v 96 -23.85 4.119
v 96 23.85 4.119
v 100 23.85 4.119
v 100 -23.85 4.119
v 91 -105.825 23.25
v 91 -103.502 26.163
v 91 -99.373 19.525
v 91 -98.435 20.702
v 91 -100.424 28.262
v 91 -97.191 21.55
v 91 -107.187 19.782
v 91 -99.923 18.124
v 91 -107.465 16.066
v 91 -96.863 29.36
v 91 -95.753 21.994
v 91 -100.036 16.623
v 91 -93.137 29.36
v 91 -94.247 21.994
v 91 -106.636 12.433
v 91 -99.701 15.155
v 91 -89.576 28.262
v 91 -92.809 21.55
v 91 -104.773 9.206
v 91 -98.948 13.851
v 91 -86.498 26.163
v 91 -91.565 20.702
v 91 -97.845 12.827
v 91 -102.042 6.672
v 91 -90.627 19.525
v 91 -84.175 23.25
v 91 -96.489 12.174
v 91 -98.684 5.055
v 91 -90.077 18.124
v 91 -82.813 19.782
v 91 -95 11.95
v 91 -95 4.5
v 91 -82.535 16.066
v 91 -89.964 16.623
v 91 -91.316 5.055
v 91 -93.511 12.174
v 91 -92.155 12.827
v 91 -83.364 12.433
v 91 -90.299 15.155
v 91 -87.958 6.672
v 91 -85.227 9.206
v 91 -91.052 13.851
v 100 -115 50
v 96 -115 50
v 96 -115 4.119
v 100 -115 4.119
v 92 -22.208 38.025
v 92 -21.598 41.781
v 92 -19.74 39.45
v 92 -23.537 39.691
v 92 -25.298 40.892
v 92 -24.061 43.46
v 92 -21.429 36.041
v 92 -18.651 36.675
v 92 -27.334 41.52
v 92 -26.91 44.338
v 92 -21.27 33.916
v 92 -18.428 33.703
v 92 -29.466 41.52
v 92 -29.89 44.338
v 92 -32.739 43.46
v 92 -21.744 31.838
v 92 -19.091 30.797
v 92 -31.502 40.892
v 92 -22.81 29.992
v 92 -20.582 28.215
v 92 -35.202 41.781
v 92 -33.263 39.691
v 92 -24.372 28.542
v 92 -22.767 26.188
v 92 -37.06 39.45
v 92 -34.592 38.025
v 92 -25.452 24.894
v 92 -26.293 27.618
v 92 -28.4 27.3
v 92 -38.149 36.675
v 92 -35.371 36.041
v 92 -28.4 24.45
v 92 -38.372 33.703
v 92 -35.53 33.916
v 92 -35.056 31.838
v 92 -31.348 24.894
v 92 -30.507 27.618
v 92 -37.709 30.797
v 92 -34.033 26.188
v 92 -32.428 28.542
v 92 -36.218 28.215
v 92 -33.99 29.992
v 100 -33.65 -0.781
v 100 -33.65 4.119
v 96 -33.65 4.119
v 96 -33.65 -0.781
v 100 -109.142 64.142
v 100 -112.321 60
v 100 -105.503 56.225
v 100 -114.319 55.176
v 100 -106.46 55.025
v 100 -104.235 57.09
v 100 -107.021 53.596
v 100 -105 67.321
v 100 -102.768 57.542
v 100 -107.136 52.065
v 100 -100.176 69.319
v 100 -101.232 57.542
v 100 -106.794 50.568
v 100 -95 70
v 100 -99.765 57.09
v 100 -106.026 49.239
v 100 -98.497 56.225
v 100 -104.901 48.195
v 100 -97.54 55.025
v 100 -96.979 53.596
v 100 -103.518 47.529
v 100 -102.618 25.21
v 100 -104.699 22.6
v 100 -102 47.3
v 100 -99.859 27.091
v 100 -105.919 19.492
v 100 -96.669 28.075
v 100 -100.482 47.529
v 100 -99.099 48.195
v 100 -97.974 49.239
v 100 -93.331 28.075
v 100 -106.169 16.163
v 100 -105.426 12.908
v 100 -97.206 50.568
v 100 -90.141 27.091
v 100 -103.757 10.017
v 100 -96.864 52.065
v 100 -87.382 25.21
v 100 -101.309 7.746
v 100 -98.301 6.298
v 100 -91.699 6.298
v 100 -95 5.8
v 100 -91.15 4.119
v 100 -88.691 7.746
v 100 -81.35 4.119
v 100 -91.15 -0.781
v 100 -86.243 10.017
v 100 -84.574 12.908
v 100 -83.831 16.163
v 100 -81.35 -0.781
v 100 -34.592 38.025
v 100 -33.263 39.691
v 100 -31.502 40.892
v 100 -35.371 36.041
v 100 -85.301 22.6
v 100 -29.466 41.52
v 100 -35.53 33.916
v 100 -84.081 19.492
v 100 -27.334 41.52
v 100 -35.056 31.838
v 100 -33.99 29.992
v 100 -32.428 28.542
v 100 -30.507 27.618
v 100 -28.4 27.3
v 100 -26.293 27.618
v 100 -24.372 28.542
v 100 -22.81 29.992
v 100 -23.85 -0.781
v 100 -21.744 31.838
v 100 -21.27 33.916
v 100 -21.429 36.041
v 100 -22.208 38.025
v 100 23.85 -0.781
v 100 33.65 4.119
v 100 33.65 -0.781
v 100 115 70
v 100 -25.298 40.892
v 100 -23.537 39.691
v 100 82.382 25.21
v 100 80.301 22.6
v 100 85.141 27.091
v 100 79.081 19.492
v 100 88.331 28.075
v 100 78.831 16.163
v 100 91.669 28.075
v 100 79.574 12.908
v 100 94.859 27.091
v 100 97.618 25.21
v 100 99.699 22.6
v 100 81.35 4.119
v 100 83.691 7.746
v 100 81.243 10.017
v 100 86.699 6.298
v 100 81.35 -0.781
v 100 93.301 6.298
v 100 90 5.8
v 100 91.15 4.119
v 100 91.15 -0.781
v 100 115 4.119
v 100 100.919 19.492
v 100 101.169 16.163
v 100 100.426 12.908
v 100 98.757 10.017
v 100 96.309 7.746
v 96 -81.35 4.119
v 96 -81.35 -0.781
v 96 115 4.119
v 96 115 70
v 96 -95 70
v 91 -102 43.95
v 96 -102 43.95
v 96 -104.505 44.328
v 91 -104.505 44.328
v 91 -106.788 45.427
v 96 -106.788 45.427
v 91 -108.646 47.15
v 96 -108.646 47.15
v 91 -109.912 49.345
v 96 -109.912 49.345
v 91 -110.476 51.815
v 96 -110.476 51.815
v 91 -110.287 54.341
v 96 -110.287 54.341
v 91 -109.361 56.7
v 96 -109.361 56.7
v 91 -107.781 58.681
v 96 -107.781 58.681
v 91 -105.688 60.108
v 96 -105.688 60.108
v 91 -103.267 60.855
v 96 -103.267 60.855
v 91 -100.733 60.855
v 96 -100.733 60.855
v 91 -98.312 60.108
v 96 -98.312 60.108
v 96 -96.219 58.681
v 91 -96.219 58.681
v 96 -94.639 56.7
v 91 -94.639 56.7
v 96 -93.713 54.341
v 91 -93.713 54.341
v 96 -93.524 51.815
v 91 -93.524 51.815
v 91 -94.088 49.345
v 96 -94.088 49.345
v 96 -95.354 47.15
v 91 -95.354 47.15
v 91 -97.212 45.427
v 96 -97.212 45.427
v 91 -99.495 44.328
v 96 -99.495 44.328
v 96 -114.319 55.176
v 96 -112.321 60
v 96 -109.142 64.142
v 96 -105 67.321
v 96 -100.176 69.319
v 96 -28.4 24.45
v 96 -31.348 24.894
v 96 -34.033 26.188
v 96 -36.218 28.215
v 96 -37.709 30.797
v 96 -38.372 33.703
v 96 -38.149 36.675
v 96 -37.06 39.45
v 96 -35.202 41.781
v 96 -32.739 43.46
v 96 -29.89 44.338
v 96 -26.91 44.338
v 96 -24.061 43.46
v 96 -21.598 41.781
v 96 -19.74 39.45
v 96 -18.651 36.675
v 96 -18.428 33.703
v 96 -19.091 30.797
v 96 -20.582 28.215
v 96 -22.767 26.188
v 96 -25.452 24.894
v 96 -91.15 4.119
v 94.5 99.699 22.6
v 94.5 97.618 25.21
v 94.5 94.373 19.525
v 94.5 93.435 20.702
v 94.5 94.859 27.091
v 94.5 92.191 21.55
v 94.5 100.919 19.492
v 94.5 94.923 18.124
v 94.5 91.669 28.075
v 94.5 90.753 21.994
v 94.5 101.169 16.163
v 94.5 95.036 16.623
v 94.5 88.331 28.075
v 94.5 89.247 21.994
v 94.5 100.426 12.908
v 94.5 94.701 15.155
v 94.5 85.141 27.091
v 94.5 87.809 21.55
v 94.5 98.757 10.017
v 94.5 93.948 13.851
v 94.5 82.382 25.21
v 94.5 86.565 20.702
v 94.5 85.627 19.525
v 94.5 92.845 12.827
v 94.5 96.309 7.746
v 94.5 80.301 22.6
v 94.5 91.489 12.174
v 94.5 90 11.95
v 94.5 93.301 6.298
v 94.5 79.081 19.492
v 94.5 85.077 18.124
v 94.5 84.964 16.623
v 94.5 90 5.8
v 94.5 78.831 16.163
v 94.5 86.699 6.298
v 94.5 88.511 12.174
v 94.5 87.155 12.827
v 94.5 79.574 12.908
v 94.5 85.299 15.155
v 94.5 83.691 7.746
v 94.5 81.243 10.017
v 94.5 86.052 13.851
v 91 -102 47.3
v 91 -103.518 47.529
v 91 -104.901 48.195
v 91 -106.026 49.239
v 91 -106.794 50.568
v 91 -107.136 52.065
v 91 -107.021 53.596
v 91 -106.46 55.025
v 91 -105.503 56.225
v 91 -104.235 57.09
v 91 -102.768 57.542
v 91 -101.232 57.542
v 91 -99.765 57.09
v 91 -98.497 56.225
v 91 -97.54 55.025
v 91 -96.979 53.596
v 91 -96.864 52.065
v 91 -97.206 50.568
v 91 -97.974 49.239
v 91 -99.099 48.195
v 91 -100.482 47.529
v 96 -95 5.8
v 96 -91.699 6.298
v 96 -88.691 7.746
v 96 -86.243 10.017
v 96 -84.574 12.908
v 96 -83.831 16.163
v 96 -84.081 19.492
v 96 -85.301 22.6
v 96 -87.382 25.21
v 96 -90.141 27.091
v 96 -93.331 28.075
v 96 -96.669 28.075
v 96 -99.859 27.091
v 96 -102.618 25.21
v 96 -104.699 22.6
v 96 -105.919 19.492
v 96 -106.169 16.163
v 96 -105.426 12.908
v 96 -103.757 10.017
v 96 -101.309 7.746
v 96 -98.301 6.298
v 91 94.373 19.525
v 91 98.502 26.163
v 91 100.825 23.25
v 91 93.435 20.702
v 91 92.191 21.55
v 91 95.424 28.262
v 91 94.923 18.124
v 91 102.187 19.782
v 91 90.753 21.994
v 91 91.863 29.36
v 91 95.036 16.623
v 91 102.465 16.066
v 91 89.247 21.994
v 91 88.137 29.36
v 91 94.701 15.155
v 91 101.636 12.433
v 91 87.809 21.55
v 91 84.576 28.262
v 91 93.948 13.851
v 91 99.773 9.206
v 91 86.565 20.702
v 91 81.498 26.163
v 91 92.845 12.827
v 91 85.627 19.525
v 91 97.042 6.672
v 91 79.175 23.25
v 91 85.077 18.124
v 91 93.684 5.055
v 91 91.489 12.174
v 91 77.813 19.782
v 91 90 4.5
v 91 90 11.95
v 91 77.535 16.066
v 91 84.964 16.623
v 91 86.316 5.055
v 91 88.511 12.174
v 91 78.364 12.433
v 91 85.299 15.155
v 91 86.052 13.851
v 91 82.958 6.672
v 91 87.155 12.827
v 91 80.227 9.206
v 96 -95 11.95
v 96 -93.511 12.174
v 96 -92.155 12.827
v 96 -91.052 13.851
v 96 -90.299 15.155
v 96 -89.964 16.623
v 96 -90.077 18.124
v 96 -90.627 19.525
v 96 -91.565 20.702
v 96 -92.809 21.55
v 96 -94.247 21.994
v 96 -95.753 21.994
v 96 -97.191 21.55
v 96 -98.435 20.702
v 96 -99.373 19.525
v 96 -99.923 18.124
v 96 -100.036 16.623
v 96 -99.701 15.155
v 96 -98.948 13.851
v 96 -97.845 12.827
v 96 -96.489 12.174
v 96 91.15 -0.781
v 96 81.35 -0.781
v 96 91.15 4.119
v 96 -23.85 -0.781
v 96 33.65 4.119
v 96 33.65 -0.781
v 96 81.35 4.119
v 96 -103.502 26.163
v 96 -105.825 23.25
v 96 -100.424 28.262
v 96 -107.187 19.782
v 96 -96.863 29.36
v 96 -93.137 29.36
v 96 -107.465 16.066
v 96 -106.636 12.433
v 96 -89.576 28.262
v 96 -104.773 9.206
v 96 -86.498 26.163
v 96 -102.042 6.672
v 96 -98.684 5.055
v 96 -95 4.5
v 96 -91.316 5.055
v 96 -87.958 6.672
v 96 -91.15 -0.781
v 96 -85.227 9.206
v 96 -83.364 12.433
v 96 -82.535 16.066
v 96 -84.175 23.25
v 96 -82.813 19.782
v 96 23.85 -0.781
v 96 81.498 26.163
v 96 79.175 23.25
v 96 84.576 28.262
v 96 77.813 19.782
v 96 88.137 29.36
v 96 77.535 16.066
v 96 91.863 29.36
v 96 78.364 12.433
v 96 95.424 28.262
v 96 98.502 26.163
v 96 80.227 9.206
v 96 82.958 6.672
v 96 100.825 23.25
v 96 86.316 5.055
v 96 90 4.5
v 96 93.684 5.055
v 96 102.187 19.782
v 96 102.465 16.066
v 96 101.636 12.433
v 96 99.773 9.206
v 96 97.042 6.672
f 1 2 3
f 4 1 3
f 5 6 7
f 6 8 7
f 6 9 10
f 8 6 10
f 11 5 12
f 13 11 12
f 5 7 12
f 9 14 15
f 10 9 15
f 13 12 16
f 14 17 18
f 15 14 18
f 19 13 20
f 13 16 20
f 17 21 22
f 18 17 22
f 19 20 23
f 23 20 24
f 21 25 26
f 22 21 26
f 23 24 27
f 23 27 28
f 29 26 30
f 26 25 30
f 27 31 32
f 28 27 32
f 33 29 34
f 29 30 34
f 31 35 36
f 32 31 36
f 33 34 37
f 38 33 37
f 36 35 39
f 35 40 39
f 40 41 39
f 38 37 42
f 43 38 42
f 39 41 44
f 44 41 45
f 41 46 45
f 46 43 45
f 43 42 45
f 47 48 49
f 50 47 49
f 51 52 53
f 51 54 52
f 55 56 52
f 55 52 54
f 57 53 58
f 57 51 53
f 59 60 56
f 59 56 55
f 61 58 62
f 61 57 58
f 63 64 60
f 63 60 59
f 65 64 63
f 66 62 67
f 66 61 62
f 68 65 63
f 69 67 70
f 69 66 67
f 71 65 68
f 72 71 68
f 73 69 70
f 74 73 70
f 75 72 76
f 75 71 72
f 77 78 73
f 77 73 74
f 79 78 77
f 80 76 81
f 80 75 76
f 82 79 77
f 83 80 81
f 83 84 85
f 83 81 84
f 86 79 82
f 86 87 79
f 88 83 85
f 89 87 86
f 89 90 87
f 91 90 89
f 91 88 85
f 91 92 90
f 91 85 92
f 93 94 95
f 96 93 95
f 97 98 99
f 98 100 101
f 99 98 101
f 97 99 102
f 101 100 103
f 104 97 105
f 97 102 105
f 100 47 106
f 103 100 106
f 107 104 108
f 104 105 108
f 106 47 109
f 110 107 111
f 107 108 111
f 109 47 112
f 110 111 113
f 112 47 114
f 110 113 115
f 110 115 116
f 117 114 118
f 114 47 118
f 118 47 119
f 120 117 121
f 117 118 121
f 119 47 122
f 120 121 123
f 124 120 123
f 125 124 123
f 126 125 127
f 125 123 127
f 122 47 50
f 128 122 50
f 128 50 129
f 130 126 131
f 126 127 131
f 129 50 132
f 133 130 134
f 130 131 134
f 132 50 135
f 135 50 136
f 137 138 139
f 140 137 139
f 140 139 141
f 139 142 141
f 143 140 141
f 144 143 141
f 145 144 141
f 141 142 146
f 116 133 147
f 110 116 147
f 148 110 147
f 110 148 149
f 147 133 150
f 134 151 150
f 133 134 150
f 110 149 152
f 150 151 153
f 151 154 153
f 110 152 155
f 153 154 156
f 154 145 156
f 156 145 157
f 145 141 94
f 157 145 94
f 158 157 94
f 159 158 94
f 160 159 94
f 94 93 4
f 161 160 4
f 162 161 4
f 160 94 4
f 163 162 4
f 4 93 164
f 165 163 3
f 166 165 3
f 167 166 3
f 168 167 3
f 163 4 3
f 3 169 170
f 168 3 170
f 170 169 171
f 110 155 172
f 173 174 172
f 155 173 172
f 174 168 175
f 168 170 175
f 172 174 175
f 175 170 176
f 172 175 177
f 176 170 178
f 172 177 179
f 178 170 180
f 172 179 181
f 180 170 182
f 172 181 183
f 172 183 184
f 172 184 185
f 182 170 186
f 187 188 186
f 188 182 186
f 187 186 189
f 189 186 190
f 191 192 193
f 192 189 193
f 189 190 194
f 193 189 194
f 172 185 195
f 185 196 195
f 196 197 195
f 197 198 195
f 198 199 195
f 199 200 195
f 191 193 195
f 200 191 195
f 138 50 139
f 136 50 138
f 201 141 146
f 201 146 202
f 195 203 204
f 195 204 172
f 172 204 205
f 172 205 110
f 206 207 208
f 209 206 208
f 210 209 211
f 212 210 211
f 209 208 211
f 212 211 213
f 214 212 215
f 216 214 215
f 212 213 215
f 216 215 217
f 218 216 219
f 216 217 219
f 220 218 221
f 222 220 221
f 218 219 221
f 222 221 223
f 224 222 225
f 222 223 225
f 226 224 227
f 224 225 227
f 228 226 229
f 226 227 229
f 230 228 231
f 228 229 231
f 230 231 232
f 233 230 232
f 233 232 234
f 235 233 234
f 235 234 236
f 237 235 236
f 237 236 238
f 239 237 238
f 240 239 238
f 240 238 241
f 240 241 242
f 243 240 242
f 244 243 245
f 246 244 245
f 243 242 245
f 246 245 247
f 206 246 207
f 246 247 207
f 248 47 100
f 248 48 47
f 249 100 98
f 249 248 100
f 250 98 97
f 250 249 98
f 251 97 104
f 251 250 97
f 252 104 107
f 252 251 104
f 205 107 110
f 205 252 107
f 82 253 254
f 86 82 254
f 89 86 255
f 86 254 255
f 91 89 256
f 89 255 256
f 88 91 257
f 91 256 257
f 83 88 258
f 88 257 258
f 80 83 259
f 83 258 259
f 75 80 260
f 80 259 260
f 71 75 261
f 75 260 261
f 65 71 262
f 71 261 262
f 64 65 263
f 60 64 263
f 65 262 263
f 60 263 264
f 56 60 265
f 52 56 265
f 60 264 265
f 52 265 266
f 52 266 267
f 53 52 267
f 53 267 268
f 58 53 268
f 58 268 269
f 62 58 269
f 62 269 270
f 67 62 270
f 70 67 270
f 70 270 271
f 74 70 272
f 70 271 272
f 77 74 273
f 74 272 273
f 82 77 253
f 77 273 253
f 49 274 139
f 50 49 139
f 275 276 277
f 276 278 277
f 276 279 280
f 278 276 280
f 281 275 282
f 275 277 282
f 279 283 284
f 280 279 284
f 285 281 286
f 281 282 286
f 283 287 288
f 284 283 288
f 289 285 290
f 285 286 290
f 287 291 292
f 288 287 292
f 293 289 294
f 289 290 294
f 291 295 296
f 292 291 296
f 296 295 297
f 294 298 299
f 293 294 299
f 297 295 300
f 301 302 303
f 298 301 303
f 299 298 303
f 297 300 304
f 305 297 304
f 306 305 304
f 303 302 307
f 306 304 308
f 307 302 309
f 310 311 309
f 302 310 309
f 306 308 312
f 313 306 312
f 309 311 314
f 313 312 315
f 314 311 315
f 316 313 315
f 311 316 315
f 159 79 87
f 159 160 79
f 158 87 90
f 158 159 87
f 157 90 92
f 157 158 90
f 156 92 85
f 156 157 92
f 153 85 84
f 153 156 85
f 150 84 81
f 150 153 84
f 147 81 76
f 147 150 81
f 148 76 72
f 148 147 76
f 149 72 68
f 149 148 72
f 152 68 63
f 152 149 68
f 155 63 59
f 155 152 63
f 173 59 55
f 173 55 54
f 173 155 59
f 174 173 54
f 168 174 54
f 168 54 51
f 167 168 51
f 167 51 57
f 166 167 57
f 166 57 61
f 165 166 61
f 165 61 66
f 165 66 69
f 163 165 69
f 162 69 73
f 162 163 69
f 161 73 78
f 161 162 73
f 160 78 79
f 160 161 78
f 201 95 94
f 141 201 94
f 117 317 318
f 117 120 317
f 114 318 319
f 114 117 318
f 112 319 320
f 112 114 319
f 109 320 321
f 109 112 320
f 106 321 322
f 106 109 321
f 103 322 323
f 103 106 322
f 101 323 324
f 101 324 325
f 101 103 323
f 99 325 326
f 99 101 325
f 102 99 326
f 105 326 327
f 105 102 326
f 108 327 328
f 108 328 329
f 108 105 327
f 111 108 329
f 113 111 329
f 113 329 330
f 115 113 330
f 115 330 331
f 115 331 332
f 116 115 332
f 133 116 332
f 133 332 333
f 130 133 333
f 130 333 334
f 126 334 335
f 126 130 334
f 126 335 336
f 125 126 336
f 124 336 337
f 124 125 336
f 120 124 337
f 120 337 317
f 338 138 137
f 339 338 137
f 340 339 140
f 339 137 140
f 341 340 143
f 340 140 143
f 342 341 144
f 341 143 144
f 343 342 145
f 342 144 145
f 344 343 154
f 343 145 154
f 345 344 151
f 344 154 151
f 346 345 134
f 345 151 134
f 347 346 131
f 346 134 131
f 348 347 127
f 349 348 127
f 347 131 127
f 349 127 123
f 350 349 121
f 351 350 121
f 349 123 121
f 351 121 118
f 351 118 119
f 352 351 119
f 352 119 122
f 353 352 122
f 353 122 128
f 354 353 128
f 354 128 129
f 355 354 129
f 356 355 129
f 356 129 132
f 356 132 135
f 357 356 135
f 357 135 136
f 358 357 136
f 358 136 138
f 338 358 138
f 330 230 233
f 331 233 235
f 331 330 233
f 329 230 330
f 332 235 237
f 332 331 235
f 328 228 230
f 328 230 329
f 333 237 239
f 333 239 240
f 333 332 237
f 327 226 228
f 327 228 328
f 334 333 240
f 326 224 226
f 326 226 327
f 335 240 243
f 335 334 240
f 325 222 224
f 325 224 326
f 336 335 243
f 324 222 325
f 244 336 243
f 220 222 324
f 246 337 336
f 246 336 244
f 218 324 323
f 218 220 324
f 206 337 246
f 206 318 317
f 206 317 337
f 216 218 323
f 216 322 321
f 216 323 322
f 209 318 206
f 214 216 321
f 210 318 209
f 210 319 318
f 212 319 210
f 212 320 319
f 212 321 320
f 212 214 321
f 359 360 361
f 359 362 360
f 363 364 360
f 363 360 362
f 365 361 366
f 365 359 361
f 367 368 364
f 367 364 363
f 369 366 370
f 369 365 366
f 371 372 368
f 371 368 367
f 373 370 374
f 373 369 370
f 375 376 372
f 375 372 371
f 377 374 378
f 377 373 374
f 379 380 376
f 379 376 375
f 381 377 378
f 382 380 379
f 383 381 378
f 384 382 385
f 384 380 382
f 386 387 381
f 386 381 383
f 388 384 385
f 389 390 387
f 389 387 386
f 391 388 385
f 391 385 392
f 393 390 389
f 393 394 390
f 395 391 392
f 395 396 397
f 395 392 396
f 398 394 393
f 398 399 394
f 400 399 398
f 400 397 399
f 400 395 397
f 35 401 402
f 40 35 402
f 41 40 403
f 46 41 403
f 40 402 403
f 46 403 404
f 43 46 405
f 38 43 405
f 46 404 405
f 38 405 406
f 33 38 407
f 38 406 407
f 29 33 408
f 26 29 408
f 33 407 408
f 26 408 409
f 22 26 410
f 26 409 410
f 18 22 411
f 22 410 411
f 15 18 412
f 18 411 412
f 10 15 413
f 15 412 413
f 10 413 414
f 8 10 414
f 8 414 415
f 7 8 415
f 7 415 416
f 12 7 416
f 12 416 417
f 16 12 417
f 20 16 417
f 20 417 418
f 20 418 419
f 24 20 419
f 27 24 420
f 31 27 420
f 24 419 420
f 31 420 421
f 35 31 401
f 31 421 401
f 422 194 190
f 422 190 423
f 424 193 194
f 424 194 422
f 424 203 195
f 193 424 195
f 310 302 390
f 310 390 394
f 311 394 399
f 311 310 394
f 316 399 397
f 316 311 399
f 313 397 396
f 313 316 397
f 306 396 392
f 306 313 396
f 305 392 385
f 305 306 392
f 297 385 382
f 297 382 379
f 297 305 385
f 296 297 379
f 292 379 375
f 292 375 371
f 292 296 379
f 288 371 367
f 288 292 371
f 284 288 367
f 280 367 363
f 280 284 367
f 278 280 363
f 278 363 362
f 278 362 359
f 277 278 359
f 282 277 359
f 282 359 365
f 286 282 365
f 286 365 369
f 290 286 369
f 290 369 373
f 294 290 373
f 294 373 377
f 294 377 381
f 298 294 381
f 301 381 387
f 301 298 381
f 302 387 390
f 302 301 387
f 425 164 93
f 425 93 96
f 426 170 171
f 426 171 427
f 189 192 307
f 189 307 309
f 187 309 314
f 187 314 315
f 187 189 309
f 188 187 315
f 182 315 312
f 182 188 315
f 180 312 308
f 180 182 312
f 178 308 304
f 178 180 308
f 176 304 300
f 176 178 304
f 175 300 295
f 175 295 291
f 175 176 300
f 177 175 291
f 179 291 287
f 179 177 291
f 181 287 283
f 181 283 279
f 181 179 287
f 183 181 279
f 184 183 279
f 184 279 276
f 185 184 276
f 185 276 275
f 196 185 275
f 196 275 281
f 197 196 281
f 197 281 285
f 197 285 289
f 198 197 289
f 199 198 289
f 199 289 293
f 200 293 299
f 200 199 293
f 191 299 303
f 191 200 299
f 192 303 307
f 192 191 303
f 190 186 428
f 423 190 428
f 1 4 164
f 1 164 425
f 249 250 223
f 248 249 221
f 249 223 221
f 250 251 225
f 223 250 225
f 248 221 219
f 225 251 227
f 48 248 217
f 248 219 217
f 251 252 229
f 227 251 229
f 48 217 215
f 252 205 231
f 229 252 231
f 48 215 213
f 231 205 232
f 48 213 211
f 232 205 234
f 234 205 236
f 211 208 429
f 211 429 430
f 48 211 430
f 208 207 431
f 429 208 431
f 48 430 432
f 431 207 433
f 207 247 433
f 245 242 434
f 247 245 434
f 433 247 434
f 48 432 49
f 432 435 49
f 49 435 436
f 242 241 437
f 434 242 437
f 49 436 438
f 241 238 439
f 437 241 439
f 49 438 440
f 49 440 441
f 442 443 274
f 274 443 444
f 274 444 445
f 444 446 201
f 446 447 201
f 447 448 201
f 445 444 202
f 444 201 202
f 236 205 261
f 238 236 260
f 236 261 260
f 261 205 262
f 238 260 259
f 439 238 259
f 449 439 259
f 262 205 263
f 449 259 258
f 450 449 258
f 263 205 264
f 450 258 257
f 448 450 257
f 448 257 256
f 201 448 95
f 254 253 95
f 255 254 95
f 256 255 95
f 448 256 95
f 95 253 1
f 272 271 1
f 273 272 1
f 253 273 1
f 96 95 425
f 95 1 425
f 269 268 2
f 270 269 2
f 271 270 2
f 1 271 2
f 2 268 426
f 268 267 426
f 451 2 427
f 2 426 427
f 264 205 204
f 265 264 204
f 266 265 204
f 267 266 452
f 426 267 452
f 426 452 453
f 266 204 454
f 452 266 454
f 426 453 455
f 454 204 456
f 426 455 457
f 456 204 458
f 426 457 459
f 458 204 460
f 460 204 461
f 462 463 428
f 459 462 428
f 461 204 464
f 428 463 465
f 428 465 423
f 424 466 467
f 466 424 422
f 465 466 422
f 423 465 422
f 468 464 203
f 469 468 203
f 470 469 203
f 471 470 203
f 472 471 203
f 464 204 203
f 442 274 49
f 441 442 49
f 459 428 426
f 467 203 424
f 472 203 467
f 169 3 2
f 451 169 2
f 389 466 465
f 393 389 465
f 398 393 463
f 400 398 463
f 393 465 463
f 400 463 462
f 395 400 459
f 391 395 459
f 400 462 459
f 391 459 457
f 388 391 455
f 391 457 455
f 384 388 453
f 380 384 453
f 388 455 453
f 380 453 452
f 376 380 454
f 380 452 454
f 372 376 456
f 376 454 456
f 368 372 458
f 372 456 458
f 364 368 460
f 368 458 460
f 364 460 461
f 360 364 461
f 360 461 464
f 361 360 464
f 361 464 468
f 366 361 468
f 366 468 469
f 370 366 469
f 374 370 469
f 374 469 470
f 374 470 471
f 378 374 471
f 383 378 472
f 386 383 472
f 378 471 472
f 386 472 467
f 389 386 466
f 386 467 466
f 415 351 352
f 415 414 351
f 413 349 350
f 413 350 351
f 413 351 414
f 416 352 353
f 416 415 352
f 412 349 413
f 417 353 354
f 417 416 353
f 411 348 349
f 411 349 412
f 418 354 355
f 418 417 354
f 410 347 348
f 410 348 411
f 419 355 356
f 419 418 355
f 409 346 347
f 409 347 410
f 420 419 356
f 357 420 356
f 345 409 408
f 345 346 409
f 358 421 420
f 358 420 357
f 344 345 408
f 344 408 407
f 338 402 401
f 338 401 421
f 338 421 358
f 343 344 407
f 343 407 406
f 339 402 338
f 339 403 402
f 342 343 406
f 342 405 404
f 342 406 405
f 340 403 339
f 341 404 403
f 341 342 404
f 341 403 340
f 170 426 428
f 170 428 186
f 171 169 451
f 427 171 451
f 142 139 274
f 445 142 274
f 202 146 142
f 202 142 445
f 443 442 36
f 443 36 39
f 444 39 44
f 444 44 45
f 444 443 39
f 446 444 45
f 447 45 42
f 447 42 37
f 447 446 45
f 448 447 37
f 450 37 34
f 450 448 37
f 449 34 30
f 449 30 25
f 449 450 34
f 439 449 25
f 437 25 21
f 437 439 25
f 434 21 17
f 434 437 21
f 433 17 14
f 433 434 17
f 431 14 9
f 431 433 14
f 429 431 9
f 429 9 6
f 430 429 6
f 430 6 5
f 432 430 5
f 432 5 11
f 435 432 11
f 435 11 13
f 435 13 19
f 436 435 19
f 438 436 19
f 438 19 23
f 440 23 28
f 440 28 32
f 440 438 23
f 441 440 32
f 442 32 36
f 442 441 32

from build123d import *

# Parameters (mm, degrees)
SKETCH1_W            = 200
SKETCH1_H            = 230
BOSS_EXTRUDE1_DEPTH  = 70
SKETCH2_W            = 192
SKETCH2_H            = 222
CUT_EXTRUDE1_DEPTH   = 66
SKETCH4_W            = 196
SKETCH4_H            = 25
CUT_EXTRUDE3_DEPTH   = 10
SKETCH10_R           = 5
CUT_EXTRUDE8_DEPTH   = 167.075284133
SKETCH11_W           = 2
SKETCH11_H           = 10
BOSS_EXTRUDE2_DEPTH  = 20
SKETCH12_W           = 2
SKETCH12_H           = 5
CUT_EXTRUDE9_DEPTH   = 20
FILLET1_R            = 2.5
SKETCH13_W           = 2
SKETCH13_H           = 10
BOSS_EXTRUDE3_DEPTH  = 20
SKETCH14_W           = 2
SKETCH14_H           = 5
CUT_EXTRUDE10_DEPTH  = 20
FILLET2_R            = 2.5
SKETCH15_W           = 192
SKETCH15_H           = 66
CUT_EXTRUDE11_DEPTH  = 267.458251889
BOSS_EXTRUDE4_DEPTH  = 2
SKETCH18_R           = 7.15
CUT_EXTRUDE12_DEPTH  = 248.638849941
SKETCH19_R           = 5.05
CUT_EXTRUDE13_DEPTH  = 248.638849941
SKETCH20_R           = 5.05
CUT_EXTRUDE14_DEPTH  = 248.638849941
BOSS_EXTRUDE5_START  = 2
BOSS_EXTRUDE5_DEPTH  = 2
SKETCH21_W           = 20
SKETCH21_H           = 10
CUT_EXTRUDE15_DEPTH  = 248.638849941
SKETCH22_W           = 92
SKETCH22_H           = 40
CUT_EXTRUDE16_DEPTH  = 10
SKETCH24_R           = 5.15
CUT_EXTRUDE18_DEPTH  = 242.091269025
FILLET3_R            = 20
FILLET4_R            = 20
SKETCH25_W           = 200
SKETCH25_H           = 4.119110625
CUT_EXTRUDE19_DEPTH  = 261.384331326
SKETCH26_W           = 4
SKETCH26_H           = 65.880889375
CUT_EXTRUDE20_DEPTH  = 261.384331326
SKETCH27_W           = 4
SKETCH27_H           = 9.8
BOSS_EXTRUDE6_DEPTH  = 4.9
SKETCH28_W           = 4
SKETCH28_H           = 9.8
BOSS_EXTRUDE7_DEPTH  = 4.9
SKETCH29_R           = 12.5
SKETCH29_R_2         = 5.05
BOSS_EXTRUDE8_DEPTH  = 5
SKETCH30_R           = 8.5
SKETCH30_R_2         = 5.15
BOSS_EXTRUDE9_DEPTH  = 5
SKETCH31_R           = 10
SKETCH31_R_2         = 7.15
BOSS_EXTRUDE10_DEPTH = 4
SKETCH32_R           = 11.2
CUT_EXTRUDE21_DEPTH  = 5.5


with BuildPart() as part:
    # Sketch1 → Boss-Extrude1 (new body)
    with BuildSketch(Plane.XY):
        Rectangle(SKETCH1_W, SKETCH1_H)
    extrude(amount=BOSS_EXTRUDE1_DEPTH)

    # Sketch2 → Cut-Extrude1 (cut)
    with BuildSketch(Plane.XY.offset(70)):
        Rectangle(SKETCH2_W, SKETCH2_H)
    extrude(amount=-CUT_EXTRUDE1_DEPTH, mode=Mode.SUBTRACT)

    # Sketch4 → Cut-Extrude3 (cut)
    with BuildSketch(Plane.XZ.offset(115)):
        with Locations((0, 57.5)):
            Rectangle(SKETCH4_W, SKETCH4_H)
    extrude(amount=-CUT_EXTRUDE3_DEPTH, mode=Mode.SUBTRACT)

    # Sketch10 → Cut-Extrude8 (cut, through all)
    with BuildSketch(Plane.XY.offset(4)):
        with Locations((0, -11)):
            Circle(SKETCH10_R)
    extrude(amount=-CUT_EXTRUDE8_DEPTH, mode=Mode.SUBTRACT)

    # Sketch11 → Boss-Extrude2 (add)
    with BuildSketch(Plane.XY.offset(70)):
        with Locations((-99, -110)):
            Rectangle(SKETCH11_W, SKETCH11_H)
    extrude(amount=BOSS_EXTRUDE2_DEPTH)

    # Sketch12 → Cut-Extrude9 (cut)
    with BuildSketch(Plane.XY.offset(90)):
        with Locations((-99, -110)):
            Rectangle(SKETCH12_W, SKETCH12_H)
    extrude(amount=-CUT_EXTRUDE9_DEPTH, mode=Mode.SUBTRACT)

    # Fillet1
    fillet1_edges = [part.edges().sort_by_distance(p)[0] for p in [
        (-99, -112.5, 70),
        (-99, -107.5, 70),
    ]]
    fillet(fillet1_edges, radius=FILLET1_R - 0.0001)  # a hair under: the kernel refuses the full size

    # Sketch13 → Boss-Extrude3 (add)
    with BuildSketch(Plane.XY.offset(70)):
        with Locations((99, -110)):
            Rectangle(SKETCH13_W, SKETCH13_H)
    extrude(amount=BOSS_EXTRUDE3_DEPTH)

    # Sketch14 → Cut-Extrude10 (cut)
    with BuildSketch(Plane.XY.offset(90)):
        with Locations((99, -110)):
            Rectangle(SKETCH14_W, SKETCH14_H)
    extrude(amount=-CUT_EXTRUDE10_DEPTH, mode=Mode.SUBTRACT)

    # Fillet2
    fillet2_edges = [part.edges().sort_by_distance(p)[0] for p in [
        (99, -112.5, 70),
        (99, -107.5, 70),
    ]]
    fillet(fillet2_edges, radius=FILLET2_R - 0.0001)  # a hair under: the kernel refuses the full size

    # Sketch15 → Cut-Extrude11 (cut, through all)
    with BuildSketch(Plane(origin=(0, 115, 0), x_dir=(1, 0, 0), z_dir=(0, 1, 0))):
        with Locations((0, -37)):
            Rectangle(SKETCH15_W, SKETCH15_H)
    extrude(amount=-CUT_EXTRUDE11_DEPTH, mode=Mode.SUBTRACT)

    # Sketch16 → Boss-Extrude4 (add)
    with BuildSketch(Plane(origin=(-98, 0, 0), x_dir=(0, 0, -1), z_dir=(1, 0, 0))):
        with BuildLine():
            Line((-90, -107.5), (-72.5, -107.5))
            ThreePointArc((-72.5, -107.5), (-70, -110), (-72.5, -112.5))
            Line((-72.5, -112.5), (-90, -112.5))
            Line((-90, -112.5), (-90, -115))
            Line((-90, -115), (-45, -115))
            Line((-45, -115), (-45, -105))
            Line((-45, -105), (-90, -105))
            Line((-90, -105), (-90, -107.5))
        make_face()
    extrude(amount=BOSS_EXTRUDE4_DEPTH)

    # Sketch18 → Cut-Extrude12 (cut, through all)
    with BuildSketch(Plane(origin=(100, 0, 0), x_dir=(0, 0, -1), z_dir=(1, 0, 0))):
        with Locations((-34.45, -28.4)):
            Circle(SKETCH18_R)
    extrude(amount=-CUT_EXTRUDE12_DEPTH, mode=Mode.SUBTRACT)

    # Sketch19 → Cut-Extrude13 (cut, through all)
    with BuildSketch(Plane(origin=(100, 0, 0), x_dir=(0, 0, -1), z_dir=(1, 0, 0))):
        with Locations((-17, -95)):
            Circle(SKETCH19_R)
    extrude(amount=-CUT_EXTRUDE13_DEPTH, mode=Mode.SUBTRACT)

    # Sketch20 → Cut-Extrude14 (cut, through all)
    with BuildSketch(Plane(origin=(100, 0, 0), x_dir=(0, 0, -1), z_dir=(1, 0, 0))):
        with Locations((-17, 90)):
            Circle(SKETCH20_R)
    extrude(amount=-CUT_EXTRUDE14_DEPTH, mode=Mode.SUBTRACT)

    # Sketch17 → Boss-Extrude5 (add)
    with BuildSketch(Plane.ZY.offset(-98).offset(BOSS_EXTRUDE5_START)):
        with BuildLine():
            Line((90, -107.5), (72.5, -107.5))
            ThreePointArc((72.5, -107.5), (70, -110), (72.5, -112.5))
            Line((72.5, -112.5), (90, -112.5))
            Line((90, -112.5), (90, -115))
            Line((90, -115), (45, -115))
            Line((45, -115), (45, -105))
            Line((45, -105), (90, -105))
            Line((90, -105), (90, -107.5))
        make_face()
    extrude(amount=-BOSS_EXTRUDE5_DEPTH)

    # Sketch21 → Cut-Extrude15 (cut, through all)
    with BuildSketch(Plane(origin=(100, 0, 0), x_dir=(0, 0, -1), z_dir=(1, 0, 0))):
        with Locations((-80, -110)):
            Rectangle(SKETCH21_W, SKETCH21_H)
    extrude(amount=-CUT_EXTRUDE15_DEPTH, mode=Mode.SUBTRACT)

    # Sketch22 → Cut-Extrude16 (cut)
    with BuildSketch(Plane.XY.offset(4)):
        with Locations((0, 95)):
            Rectangle(SKETCH22_W, SKETCH22_H)
    extrude(amount=-CUT_EXTRUDE16_DEPTH, mode=Mode.SUBTRACT)

    # Sketch24 → Cut-Extrude18 (cut, through all)
    with BuildSketch(Plane(origin=(100, 0, 0), x_dir=(0, 0, -1), z_dir=(1, 0, 0))):
        with Locations((-52.45, -102)):
            Circle(SKETCH24_R)
    extrude(amount=-CUT_EXTRUDE18_DEPTH, mode=Mode.SUBTRACT)

    # Fillet3
    fillet3_edges = [part.edges().sort_by_distance(p)[0] for p in [
        (98, -115, 70),
    ]]
    fillet(fillet3_edges, radius=FILLET3_R)

    # Fillet4
    fillet4_edges = [part.edges().sort_by_distance(p)[0] for p in [
        (-98, -115, 70),
    ]]
    fillet(fillet4_edges, radius=FILLET4_R)

    # Sketch25 → Cut-Extrude19 (cut, through all)
    with BuildSketch(Plane(origin=(0, 115, 0), x_dir=(1, 0, 0), z_dir=(0, 1, 0))):
        with Locations((0, -2.059555313)):
            Rectangle(SKETCH25_W, SKETCH25_H)
    extrude(amount=-CUT_EXTRUDE19_DEPTH, mode=Mode.SUBTRACT)


with BuildPart() as cut_extrude19_piece_1:
    # of the separate pieces the step leaves, piece 1, a body of its own (cut_extrude19_pieces)
    add(part.part.solids().sort_by_distance((100, -115, 4.119110625))[0])

    # Sketch27 → Boss-Extrude6 (add)
    with BuildSketch(Plane(origin=(0, 0, 4.119110625), x_dir=(-1, 0, 0), z_dir=(0, 0, -1))):
        with Locations((-98, -86.25)):
            Rectangle(SKETCH27_W, SKETCH27_H)
    boss_extrude6 = extrude(amount=BOSS_EXTRUDE6_DEPTH)

    # Sketch28 → Boss-Extrude7 (add)
    with BuildSketch(Plane(origin=(0, 0, 4.119110625), x_dir=(-1, 0, 0), z_dir=(0, 0, -1))):
        with Locations((-98, -28.75)):
            Rectangle(SKETCH28_W, SKETCH28_H)
    boss_extrude7 = extrude(amount=BOSS_EXTRUDE7_DEPTH)

    # Mirror1: Boss-Extrude6, Boss-Extrude7 across plane
    add(boss_extrude6.mirror(Plane.ZX))
    add(boss_extrude7.mirror(Plane.ZX))

    # Sketch29 → Boss-Extrude8 (add)
    with BuildSketch(Plane.ZY.offset(-96)):
        with Locations(Location((17, 90, 0), (0, 0, 180))):
            Circle(SKETCH29_R)
        with Locations(Location((17, 90, 0), (0, 0, 180))):
            Circle(SKETCH29_R_2, mode=Mode.SUBTRACT)
    boss_extrude8 = extrude(amount=BOSS_EXTRUDE8_DEPTH)

    # Sketch30 → Boss-Extrude9 (add)
    with BuildSketch(Plane.ZY.offset(-96)):
        with Locations(Location((52.45, -102, 0), (0, 0, 180))):
            Circle(SKETCH30_R)
        with Locations(Location((52.45, -102, 0), (0, 0, 180))):
            Circle(SKETCH30_R_2, mode=Mode.SUBTRACT)
    extrude(amount=BOSS_EXTRUDE9_DEPTH)

    # Sketch31 → Boss-Extrude10 (add)
    with BuildSketch(Plane.ZY.offset(-96)):
        with Locations(Location((34.45, -28.4, 0), (0, 0, 180))):
            Circle(SKETCH31_R)
        with Locations(Location((34.45, -28.4, 0), (0, 0, 180))):
            Circle(SKETCH31_R_2, mode=Mode.SUBTRACT)
    extrude(amount=BOSS_EXTRUDE10_DEPTH)

    # Sketch32 → Cut-Extrude21 (cut)
    with BuildSketch(Plane(origin=(100, 0, 0), x_dir=(0, 0, -1), z_dir=(1, 0, 0))):
        with Locations((-17, -95)):
            Circle(SKETCH32_R)
    cut_extrude21 = extrude(amount=-CUT_EXTRUDE21_DEPTH, mode=Mode.SUBTRACT)

    # Mirror4: Boss-Extrude8 across plane
    add(boss_extrude8.mirror(Plane.ZX.offset(-2.5)))

    # Mirror5: Cut-Extrude21 across plane
    add(cut_extrude21.mirror(Plane.ZX.offset(-2.5)), mode=Mode.SUBTRACT)


with BuildPart() as cut_extrude19_piece_2:
    # of the separate pieces the step leaves, piece 2, a body of its own (cut_extrude19_pieces)
    add(part.part.solids().sort_by_distance((-100, -115, 50))[0])

    # Sketch26 → Cut-Extrude20 (cut, through all)
    with BuildSketch(Plane(origin=(0, 115, 0), x_dir=(1, 0, 0), z_dir=(0, 1, 0))):
        with Locations((-98, -37.059555313)):
            Rectangle(SKETCH26_W, SKETCH26_H)
    extrude(amount=-CUT_EXTRUDE20_DEPTH, mode=Mode.SUBTRACT)


solid = cut_extrude19_piece_1.part
